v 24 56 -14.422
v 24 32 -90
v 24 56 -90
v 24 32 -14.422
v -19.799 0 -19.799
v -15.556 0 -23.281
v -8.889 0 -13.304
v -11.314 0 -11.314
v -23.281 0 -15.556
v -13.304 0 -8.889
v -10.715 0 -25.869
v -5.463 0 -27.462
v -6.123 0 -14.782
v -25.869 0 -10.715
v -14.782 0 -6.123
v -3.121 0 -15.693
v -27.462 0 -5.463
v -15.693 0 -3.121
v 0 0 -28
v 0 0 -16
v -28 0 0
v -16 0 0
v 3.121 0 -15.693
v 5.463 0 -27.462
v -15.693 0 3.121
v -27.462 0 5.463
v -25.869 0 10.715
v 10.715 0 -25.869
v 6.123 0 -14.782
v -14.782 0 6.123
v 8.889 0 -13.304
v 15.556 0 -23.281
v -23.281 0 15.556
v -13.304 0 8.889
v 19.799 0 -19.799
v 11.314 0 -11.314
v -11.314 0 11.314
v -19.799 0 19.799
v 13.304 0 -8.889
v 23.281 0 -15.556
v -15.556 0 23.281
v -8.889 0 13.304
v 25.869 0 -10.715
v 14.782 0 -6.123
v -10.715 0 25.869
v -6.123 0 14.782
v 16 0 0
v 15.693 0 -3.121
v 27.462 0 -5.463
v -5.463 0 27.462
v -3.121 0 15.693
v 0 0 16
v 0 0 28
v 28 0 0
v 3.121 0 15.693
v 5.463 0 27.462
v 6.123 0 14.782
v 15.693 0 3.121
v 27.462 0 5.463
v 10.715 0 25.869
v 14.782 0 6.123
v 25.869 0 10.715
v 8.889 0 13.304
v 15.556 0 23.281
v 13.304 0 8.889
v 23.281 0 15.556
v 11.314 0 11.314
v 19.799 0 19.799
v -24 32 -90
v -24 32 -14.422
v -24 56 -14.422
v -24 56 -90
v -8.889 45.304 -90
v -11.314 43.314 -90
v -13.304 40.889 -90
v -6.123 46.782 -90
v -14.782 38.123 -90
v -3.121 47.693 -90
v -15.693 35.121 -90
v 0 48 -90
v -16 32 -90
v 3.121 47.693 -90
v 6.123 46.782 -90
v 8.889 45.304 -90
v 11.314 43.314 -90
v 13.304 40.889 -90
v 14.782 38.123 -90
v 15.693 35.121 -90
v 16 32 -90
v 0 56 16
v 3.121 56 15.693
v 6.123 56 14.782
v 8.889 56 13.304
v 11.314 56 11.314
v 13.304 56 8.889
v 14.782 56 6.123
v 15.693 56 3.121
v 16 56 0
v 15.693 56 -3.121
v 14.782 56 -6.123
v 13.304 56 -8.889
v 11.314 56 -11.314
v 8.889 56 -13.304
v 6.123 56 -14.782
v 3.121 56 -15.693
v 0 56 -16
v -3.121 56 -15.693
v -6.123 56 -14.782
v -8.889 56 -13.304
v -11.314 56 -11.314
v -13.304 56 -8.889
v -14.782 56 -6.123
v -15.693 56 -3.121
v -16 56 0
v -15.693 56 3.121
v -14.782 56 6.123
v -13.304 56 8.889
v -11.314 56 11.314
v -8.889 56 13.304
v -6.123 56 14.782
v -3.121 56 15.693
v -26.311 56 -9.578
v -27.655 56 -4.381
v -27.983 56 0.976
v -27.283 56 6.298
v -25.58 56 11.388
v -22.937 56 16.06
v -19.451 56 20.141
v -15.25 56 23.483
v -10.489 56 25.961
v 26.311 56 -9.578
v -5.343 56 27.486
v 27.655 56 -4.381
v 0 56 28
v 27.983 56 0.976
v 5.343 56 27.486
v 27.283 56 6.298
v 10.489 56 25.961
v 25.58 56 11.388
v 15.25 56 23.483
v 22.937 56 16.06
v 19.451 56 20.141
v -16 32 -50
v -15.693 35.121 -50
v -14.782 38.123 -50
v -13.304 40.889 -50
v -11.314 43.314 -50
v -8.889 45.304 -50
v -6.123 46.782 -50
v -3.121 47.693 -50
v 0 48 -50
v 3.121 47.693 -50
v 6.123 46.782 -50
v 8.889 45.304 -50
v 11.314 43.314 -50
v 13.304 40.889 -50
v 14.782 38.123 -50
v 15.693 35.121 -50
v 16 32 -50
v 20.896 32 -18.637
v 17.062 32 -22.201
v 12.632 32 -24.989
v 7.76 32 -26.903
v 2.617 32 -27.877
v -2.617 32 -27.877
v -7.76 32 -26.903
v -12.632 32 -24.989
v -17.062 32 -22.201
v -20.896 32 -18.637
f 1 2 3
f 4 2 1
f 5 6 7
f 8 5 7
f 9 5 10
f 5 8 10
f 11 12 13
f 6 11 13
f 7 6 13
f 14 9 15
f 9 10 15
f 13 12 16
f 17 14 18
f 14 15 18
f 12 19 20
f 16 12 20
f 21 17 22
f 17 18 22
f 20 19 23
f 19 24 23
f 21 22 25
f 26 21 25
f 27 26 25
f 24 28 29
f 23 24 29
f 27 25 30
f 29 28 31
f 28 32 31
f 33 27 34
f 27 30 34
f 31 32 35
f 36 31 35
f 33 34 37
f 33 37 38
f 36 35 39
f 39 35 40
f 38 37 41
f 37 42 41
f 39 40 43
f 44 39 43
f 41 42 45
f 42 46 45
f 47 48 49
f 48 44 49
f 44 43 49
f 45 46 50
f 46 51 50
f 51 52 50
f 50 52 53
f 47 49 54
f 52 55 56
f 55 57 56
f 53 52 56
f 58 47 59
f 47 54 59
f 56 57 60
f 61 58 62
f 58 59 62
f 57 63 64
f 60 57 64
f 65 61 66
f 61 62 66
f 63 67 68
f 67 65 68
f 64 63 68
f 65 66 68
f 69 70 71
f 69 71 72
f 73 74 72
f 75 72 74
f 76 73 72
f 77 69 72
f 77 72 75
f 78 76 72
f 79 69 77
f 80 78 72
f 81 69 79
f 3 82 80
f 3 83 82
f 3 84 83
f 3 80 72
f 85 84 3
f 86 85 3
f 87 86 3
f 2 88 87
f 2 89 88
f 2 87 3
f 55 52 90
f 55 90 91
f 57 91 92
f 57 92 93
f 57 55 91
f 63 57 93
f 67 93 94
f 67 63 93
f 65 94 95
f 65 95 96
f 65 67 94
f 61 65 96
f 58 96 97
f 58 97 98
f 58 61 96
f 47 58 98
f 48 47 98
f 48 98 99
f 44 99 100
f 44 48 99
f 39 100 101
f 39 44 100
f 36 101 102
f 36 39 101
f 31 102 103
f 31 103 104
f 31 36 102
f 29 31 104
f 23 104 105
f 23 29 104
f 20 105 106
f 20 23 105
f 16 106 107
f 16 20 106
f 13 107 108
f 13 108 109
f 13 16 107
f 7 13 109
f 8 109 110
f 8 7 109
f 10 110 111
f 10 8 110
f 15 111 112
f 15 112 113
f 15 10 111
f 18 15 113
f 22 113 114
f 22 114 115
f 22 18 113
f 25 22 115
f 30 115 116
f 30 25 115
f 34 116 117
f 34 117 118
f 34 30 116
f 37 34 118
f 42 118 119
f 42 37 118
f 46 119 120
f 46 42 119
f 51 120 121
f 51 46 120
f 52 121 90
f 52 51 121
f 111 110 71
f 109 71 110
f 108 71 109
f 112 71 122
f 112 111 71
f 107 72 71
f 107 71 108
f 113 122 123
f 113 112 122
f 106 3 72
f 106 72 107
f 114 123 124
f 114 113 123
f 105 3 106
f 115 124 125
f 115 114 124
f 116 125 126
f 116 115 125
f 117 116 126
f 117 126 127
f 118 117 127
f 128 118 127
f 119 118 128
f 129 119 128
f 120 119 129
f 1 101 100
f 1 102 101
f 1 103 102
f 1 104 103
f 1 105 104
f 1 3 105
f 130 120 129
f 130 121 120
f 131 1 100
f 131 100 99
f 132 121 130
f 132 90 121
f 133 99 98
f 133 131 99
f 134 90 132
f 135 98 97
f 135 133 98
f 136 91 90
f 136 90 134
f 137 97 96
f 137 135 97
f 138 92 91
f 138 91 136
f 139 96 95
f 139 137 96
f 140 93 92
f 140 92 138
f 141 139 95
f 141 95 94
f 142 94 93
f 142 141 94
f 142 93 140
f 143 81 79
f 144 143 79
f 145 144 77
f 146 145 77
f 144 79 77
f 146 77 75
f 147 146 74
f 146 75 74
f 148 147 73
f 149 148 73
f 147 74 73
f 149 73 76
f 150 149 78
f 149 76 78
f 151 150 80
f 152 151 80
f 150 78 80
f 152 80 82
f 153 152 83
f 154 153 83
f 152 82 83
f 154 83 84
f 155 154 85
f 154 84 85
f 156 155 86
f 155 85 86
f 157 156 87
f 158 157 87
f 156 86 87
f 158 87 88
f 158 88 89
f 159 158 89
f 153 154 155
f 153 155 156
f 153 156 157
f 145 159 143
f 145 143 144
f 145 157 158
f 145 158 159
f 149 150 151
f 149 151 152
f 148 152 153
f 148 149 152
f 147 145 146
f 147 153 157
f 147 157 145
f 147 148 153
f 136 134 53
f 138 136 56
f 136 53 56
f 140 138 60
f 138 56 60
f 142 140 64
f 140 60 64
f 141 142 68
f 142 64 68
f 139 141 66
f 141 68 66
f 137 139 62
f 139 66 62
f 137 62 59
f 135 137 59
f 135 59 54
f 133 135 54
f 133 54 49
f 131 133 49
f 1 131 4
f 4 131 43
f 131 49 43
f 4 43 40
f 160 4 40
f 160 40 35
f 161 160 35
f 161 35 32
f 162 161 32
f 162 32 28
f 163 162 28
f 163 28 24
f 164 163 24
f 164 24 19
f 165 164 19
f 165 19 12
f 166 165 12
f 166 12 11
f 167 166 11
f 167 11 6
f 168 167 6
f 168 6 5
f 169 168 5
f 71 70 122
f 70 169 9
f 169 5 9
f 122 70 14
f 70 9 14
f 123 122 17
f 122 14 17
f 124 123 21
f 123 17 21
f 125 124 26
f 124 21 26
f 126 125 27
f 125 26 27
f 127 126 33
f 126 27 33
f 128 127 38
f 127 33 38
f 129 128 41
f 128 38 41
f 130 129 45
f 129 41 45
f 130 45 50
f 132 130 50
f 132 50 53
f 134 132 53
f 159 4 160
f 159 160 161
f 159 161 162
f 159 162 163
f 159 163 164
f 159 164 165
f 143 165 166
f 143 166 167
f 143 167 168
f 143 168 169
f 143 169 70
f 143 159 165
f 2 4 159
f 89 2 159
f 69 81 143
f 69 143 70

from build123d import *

# Parameters (mm, degrees)
SKETCH1_R           = 28
SKETCH1_R_2         = 16
BOSS_EXTRUDE1_DEPTH = 56
BOSS_EXTRUDE2_START = -24
BOSS_EXTRUDE2_DEPTH = 24
SKETCH5_R           = 16
CUT_EXTRUDE2_DEPTH  = 40


with BuildPart() as part:
    # Sketch1 → Boss-Extrude1 (new body)
    with BuildSketch(Plane(origin=(0, 0, 0), x_dir=(1, 0, 0), z_dir=(0, 1, 0))):
        with Locations(Location((0, 0, 0), (0, 0, 270))):
            Circle(SKETCH1_R)
        with Locations(Location((0, 0, 0), (0, 0, 270))):
            Circle(SKETCH1_R_2, mode=Mode.SUBTRACT)
    extrude(amount=BOSS_EXTRUDE1_DEPTH)

    # Sketch3 → Boss-Extrude2 (add)
    with BuildSketch(Plane(origin=(0, 56, 0), x_dir=(1, 0, 0), z_dir=(0, 1, 0)).offset(BOSS_EXTRUDE2_START)):
        with BuildLine():
            Line((-24, 90), (24, 90))
            Line((24, 90), (24, 14.422205102))
            ThreePointArc((24, 14.422205102), (0, 28), (-24, 14.422205102))
            Line((-24, 14.422205102), (-24, 90))
        make_face()
    extrude(amount=BOSS_EXTRUDE2_DEPTH)

    # Sketch5 → Cut-Extrude2 (cut)
    with BuildSketch(Plane(origin=(0, 0, -90), x_dir=(-1, 0, 0), z_dir=(0, 0, -1))):
        with Locations((0, 32)):
            Circle(SKETCH5_R)
    extrude(amount=-CUT_EXTRUDE2_DEPTH, mode=Mode.SUBTRACT)


solid = part.part
